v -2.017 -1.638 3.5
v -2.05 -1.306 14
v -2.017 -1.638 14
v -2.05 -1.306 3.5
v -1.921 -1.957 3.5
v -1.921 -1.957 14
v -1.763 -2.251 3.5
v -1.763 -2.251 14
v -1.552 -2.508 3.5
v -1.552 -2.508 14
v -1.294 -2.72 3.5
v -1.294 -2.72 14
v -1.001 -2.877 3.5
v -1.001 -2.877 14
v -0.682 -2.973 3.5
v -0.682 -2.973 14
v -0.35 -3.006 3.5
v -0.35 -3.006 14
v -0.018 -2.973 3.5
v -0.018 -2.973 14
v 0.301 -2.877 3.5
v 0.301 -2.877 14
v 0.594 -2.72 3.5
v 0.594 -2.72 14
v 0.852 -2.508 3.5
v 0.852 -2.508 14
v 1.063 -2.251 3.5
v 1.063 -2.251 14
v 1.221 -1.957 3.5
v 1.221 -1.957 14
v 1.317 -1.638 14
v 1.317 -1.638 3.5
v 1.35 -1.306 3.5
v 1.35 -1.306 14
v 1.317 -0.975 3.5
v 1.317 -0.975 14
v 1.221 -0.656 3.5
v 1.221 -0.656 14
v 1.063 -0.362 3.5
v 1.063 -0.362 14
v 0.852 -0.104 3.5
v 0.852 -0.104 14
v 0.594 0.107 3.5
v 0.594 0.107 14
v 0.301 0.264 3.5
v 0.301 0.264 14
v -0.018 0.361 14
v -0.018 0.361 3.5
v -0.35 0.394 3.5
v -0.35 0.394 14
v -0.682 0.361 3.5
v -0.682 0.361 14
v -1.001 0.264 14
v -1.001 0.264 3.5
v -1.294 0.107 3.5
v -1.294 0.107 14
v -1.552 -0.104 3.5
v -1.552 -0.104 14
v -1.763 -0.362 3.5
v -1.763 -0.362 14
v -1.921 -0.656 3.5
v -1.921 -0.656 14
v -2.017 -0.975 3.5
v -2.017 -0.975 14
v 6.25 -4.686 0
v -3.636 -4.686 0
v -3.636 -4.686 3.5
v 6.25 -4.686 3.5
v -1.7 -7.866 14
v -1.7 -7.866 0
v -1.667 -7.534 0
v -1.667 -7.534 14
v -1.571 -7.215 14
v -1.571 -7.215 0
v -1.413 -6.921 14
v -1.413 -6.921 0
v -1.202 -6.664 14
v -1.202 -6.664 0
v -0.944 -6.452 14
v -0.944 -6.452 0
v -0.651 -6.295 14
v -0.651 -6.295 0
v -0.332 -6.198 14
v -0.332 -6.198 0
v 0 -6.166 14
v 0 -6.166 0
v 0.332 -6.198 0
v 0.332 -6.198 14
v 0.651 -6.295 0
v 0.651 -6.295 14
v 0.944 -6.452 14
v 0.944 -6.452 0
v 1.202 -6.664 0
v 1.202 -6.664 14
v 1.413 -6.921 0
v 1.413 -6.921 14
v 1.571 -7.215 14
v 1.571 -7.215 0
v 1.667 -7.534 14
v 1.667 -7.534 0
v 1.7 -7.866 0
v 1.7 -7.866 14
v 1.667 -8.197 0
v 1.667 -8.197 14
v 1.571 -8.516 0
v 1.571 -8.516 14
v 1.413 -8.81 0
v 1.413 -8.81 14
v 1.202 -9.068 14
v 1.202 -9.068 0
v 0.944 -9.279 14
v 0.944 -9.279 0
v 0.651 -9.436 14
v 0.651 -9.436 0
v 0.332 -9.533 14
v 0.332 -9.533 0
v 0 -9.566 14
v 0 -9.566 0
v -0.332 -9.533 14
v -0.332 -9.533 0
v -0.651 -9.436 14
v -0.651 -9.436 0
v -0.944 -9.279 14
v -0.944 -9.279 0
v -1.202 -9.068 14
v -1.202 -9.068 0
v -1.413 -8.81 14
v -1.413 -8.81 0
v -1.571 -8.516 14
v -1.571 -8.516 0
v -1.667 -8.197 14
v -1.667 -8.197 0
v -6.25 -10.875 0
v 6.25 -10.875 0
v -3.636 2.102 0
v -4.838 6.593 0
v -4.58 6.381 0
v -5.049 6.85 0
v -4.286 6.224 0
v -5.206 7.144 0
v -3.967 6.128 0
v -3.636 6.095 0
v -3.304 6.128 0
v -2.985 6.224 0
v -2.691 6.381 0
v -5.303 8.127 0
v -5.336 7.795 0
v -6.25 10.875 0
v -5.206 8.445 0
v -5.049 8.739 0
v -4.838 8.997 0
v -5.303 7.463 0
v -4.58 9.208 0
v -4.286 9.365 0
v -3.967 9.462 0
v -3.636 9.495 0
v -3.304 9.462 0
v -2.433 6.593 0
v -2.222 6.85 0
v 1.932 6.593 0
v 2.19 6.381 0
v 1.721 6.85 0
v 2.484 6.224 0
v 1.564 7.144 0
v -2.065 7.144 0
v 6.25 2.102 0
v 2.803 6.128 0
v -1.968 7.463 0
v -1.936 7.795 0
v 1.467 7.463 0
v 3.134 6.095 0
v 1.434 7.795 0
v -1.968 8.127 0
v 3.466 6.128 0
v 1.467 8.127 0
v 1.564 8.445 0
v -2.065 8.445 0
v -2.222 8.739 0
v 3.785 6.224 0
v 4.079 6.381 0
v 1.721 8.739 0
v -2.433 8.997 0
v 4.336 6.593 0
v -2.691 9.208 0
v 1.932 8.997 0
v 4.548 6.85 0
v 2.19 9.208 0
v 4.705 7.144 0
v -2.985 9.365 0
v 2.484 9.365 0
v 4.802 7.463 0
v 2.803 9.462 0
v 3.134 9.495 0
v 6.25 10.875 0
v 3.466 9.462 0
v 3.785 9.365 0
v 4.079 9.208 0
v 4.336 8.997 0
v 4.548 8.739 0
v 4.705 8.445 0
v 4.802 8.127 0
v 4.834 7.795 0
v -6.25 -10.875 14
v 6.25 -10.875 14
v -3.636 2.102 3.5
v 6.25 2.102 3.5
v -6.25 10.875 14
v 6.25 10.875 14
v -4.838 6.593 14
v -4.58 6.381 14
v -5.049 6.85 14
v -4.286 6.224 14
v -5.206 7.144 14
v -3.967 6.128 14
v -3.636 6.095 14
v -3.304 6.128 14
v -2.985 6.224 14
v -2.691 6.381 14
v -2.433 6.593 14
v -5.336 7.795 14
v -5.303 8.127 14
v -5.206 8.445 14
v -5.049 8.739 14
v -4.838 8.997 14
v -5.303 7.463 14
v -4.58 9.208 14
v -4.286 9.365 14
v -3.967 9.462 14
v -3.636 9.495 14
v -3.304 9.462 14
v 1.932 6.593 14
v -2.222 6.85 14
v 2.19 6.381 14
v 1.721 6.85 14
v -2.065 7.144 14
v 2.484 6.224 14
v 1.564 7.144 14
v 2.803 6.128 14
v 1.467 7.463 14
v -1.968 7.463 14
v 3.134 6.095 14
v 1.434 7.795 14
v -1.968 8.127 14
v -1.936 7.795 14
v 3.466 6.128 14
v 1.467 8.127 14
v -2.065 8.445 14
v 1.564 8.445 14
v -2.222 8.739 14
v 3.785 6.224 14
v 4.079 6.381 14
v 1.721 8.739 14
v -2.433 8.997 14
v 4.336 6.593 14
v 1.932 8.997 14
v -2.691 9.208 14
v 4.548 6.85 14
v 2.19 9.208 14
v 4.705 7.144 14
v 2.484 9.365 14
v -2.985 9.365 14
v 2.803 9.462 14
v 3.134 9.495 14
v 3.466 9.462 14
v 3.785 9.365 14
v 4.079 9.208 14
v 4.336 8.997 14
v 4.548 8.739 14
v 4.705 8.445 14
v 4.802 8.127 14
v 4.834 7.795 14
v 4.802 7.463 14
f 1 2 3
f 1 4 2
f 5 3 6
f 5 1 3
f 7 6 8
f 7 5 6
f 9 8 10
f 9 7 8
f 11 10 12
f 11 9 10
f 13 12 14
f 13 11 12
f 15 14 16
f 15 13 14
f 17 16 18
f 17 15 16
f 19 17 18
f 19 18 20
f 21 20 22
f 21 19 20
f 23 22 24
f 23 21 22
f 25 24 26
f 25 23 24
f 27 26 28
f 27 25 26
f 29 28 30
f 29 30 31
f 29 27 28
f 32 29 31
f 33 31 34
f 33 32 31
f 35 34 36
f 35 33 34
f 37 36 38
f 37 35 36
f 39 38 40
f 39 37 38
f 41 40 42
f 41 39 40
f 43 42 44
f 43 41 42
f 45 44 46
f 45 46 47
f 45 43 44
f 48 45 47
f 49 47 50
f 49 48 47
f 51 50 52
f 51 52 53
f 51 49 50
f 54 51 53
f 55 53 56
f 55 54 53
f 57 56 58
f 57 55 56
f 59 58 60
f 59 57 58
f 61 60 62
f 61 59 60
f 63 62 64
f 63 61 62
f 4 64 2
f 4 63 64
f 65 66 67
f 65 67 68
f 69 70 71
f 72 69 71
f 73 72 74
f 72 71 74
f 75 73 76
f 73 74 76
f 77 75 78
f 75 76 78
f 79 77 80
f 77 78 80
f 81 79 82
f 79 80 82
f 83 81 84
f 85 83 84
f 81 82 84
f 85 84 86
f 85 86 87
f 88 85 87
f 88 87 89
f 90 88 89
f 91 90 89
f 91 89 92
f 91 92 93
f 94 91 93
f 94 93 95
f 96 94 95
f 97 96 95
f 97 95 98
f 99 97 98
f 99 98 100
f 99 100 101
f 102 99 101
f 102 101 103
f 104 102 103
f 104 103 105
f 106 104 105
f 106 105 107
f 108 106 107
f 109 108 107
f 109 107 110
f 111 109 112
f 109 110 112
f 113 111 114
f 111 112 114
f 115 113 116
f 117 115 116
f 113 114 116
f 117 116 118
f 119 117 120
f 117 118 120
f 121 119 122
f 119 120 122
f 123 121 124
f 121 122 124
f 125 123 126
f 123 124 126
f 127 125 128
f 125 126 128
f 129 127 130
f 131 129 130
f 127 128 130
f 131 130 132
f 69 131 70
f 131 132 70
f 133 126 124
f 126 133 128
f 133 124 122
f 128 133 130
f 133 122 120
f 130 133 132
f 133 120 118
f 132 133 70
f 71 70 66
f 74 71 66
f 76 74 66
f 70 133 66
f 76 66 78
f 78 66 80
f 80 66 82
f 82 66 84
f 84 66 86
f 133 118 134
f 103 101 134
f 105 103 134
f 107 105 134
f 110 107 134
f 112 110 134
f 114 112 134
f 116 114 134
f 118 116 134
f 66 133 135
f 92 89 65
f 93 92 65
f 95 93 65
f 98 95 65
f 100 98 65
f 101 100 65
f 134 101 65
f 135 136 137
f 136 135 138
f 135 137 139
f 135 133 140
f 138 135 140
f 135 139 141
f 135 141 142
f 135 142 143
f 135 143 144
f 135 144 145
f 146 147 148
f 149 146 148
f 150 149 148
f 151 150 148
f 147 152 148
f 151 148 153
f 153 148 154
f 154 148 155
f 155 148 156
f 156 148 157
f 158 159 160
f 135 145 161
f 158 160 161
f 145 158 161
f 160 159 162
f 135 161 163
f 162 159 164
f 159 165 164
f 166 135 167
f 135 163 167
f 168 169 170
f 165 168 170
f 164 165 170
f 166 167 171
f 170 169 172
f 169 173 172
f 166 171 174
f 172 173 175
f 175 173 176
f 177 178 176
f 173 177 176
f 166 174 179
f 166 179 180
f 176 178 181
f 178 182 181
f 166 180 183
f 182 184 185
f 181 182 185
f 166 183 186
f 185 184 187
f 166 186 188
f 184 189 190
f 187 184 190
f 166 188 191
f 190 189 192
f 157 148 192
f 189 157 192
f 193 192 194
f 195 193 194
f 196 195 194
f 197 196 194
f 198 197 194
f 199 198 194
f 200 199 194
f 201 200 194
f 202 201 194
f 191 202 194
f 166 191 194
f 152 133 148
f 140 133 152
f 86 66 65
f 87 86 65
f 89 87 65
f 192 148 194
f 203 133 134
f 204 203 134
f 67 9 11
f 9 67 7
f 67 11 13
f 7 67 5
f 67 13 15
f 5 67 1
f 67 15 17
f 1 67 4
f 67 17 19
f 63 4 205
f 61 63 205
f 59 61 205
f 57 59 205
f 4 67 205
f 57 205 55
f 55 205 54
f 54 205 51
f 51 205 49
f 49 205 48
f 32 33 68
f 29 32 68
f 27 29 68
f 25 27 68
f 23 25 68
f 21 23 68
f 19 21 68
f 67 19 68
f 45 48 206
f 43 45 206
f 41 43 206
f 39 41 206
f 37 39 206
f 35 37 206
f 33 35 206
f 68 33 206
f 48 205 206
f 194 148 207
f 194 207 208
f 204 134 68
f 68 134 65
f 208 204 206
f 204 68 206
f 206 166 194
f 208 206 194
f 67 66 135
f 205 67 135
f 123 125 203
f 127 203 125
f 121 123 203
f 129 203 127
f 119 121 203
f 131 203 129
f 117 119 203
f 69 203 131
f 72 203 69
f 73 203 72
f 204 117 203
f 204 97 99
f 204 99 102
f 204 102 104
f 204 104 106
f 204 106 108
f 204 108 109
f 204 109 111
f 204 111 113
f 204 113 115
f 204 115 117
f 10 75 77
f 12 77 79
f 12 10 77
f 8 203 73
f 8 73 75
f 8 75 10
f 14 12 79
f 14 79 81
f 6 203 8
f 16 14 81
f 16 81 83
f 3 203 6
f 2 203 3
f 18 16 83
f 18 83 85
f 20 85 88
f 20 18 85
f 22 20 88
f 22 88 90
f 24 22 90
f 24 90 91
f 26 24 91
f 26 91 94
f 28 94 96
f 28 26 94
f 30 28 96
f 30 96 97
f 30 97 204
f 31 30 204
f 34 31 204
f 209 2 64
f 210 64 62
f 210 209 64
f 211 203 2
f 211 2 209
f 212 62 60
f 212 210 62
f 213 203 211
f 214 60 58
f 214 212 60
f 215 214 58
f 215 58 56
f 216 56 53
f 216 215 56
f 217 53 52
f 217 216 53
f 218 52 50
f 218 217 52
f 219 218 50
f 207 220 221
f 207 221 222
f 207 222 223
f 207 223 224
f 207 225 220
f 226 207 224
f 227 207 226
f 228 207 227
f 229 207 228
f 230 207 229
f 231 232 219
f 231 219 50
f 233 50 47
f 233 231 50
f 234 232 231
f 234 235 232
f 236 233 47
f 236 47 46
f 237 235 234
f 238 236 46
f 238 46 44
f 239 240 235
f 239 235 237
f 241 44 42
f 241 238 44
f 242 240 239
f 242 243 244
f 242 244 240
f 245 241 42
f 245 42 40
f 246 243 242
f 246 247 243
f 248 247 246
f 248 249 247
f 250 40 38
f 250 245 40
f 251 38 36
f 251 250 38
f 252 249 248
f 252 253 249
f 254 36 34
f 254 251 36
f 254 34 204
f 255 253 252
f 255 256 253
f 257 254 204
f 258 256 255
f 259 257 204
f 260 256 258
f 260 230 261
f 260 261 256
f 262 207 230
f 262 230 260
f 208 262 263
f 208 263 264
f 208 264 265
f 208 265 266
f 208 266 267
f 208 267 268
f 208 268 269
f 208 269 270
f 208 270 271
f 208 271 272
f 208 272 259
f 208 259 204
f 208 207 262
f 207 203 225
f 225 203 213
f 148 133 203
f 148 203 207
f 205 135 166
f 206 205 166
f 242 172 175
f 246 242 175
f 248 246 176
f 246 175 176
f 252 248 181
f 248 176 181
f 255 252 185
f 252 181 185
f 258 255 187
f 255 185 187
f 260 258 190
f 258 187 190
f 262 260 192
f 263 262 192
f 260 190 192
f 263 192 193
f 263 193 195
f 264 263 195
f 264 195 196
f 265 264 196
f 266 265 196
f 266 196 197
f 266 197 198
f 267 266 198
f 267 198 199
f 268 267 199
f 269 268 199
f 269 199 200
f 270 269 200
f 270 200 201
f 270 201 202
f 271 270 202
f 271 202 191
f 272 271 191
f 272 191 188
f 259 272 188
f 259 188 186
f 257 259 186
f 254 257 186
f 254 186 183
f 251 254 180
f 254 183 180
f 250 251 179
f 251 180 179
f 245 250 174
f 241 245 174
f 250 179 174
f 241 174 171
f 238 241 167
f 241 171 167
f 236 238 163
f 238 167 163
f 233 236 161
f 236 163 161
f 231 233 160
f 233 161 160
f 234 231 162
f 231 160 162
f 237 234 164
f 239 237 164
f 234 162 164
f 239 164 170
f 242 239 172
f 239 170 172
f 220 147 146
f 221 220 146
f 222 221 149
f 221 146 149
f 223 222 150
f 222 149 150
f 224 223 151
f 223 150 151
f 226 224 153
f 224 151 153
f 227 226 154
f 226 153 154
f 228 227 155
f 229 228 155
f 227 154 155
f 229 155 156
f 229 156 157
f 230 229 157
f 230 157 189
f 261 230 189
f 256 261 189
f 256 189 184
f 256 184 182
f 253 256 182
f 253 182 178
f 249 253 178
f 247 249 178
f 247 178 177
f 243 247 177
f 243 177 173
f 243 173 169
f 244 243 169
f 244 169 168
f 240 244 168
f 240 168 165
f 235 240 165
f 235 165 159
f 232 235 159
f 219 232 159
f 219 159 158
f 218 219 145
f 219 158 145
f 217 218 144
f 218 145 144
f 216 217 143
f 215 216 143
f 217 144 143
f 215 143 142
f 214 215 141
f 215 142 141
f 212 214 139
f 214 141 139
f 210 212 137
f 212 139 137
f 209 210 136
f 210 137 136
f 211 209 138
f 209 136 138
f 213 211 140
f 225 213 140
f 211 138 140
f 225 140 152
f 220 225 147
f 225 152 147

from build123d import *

# Parameters (mm, degrees)
ESQUISSE1_W             = 12.5
ESQUISSE1_H             = 21.75
BOSS_EXTRU_3_DEPTH      = 14
ESQUISSE9_W             = 10.579409941
ESQUISSE9_H             = 6.787962443
ENL_V_MAT_EXTRU_7_DEPTH = 3.5
D_GAGEMENT_M32_D        = 3.4
D_GAGEMENT_M33_D        = 3.4
ESQUISSE23_W            = 9.88556754
ESQUISSE23_H            = 6.787962443
ESQUISSE23_R            = 1.7
BOSS_EXTRU_4_DEPTH      = 3.5


with BuildPart() as part:
    # Esquisse1 → Boss.-Extru.3 (new body)
    with BuildSketch(Plane.XY):
        Rectangle(ESQUISSE1_W, ESQUISSE1_H)
    extrude(amount=BOSS_EXTRU_3_DEPTH)

    # Esquisse9 → Enlèv. mat.-Extru.7 (cut)
    with BuildSketch(Plane.XY.offset(14)):
        with Locations((1.654137431, -1.292305661)):
            Rectangle(ESQUISSE9_W, ESQUISSE9_H)
    enl_v_mat_extru_7 = extrude(amount=-ENL_V_MAT_EXTRU_7_DEPTH, mode=Mode.SUBTRACT)

    # Dégagement M32 (through all)
    with Locations(Plane.XY.offset(14)):
        with Locations((-0.35, -1.306160818)):
            Hole(D_GAGEMENT_M32_D / 2)

    # Dégagement M33 (through all)
    with Locations(Plane.XY.offset(14)):
        with Locations((-3.63556754, 7.794867284), (3.134168266, 7.794867284), (0, -7.865811289)):
            Hole(D_GAGEMENT_M33_D / 2)

    # Symétrie1: Enlèv. mat.-Extru.7 across plane
    add(enl_v_mat_extru_7.mirror(Plane.XY.offset(7)), mode=Mode.SUBTRACT)

    # Esquisse23 → Boss.-Extru.4 (add)
    with BuildSketch(Plane.XY.offset(10.5)):
        with Locations((1.30721623, -1.292305661)):
            Rectangle(ESQUISSE23_W, ESQUISSE23_H)
        with Locations(Location((-0.35, -1.306160818, 0), (0, 0, 180))):
            Circle(ESQUISSE23_R, mode=Mode.SUBTRACT)
    extrude(amount=BOSS_EXTRU_4_DEPTH)


solid = part.part
